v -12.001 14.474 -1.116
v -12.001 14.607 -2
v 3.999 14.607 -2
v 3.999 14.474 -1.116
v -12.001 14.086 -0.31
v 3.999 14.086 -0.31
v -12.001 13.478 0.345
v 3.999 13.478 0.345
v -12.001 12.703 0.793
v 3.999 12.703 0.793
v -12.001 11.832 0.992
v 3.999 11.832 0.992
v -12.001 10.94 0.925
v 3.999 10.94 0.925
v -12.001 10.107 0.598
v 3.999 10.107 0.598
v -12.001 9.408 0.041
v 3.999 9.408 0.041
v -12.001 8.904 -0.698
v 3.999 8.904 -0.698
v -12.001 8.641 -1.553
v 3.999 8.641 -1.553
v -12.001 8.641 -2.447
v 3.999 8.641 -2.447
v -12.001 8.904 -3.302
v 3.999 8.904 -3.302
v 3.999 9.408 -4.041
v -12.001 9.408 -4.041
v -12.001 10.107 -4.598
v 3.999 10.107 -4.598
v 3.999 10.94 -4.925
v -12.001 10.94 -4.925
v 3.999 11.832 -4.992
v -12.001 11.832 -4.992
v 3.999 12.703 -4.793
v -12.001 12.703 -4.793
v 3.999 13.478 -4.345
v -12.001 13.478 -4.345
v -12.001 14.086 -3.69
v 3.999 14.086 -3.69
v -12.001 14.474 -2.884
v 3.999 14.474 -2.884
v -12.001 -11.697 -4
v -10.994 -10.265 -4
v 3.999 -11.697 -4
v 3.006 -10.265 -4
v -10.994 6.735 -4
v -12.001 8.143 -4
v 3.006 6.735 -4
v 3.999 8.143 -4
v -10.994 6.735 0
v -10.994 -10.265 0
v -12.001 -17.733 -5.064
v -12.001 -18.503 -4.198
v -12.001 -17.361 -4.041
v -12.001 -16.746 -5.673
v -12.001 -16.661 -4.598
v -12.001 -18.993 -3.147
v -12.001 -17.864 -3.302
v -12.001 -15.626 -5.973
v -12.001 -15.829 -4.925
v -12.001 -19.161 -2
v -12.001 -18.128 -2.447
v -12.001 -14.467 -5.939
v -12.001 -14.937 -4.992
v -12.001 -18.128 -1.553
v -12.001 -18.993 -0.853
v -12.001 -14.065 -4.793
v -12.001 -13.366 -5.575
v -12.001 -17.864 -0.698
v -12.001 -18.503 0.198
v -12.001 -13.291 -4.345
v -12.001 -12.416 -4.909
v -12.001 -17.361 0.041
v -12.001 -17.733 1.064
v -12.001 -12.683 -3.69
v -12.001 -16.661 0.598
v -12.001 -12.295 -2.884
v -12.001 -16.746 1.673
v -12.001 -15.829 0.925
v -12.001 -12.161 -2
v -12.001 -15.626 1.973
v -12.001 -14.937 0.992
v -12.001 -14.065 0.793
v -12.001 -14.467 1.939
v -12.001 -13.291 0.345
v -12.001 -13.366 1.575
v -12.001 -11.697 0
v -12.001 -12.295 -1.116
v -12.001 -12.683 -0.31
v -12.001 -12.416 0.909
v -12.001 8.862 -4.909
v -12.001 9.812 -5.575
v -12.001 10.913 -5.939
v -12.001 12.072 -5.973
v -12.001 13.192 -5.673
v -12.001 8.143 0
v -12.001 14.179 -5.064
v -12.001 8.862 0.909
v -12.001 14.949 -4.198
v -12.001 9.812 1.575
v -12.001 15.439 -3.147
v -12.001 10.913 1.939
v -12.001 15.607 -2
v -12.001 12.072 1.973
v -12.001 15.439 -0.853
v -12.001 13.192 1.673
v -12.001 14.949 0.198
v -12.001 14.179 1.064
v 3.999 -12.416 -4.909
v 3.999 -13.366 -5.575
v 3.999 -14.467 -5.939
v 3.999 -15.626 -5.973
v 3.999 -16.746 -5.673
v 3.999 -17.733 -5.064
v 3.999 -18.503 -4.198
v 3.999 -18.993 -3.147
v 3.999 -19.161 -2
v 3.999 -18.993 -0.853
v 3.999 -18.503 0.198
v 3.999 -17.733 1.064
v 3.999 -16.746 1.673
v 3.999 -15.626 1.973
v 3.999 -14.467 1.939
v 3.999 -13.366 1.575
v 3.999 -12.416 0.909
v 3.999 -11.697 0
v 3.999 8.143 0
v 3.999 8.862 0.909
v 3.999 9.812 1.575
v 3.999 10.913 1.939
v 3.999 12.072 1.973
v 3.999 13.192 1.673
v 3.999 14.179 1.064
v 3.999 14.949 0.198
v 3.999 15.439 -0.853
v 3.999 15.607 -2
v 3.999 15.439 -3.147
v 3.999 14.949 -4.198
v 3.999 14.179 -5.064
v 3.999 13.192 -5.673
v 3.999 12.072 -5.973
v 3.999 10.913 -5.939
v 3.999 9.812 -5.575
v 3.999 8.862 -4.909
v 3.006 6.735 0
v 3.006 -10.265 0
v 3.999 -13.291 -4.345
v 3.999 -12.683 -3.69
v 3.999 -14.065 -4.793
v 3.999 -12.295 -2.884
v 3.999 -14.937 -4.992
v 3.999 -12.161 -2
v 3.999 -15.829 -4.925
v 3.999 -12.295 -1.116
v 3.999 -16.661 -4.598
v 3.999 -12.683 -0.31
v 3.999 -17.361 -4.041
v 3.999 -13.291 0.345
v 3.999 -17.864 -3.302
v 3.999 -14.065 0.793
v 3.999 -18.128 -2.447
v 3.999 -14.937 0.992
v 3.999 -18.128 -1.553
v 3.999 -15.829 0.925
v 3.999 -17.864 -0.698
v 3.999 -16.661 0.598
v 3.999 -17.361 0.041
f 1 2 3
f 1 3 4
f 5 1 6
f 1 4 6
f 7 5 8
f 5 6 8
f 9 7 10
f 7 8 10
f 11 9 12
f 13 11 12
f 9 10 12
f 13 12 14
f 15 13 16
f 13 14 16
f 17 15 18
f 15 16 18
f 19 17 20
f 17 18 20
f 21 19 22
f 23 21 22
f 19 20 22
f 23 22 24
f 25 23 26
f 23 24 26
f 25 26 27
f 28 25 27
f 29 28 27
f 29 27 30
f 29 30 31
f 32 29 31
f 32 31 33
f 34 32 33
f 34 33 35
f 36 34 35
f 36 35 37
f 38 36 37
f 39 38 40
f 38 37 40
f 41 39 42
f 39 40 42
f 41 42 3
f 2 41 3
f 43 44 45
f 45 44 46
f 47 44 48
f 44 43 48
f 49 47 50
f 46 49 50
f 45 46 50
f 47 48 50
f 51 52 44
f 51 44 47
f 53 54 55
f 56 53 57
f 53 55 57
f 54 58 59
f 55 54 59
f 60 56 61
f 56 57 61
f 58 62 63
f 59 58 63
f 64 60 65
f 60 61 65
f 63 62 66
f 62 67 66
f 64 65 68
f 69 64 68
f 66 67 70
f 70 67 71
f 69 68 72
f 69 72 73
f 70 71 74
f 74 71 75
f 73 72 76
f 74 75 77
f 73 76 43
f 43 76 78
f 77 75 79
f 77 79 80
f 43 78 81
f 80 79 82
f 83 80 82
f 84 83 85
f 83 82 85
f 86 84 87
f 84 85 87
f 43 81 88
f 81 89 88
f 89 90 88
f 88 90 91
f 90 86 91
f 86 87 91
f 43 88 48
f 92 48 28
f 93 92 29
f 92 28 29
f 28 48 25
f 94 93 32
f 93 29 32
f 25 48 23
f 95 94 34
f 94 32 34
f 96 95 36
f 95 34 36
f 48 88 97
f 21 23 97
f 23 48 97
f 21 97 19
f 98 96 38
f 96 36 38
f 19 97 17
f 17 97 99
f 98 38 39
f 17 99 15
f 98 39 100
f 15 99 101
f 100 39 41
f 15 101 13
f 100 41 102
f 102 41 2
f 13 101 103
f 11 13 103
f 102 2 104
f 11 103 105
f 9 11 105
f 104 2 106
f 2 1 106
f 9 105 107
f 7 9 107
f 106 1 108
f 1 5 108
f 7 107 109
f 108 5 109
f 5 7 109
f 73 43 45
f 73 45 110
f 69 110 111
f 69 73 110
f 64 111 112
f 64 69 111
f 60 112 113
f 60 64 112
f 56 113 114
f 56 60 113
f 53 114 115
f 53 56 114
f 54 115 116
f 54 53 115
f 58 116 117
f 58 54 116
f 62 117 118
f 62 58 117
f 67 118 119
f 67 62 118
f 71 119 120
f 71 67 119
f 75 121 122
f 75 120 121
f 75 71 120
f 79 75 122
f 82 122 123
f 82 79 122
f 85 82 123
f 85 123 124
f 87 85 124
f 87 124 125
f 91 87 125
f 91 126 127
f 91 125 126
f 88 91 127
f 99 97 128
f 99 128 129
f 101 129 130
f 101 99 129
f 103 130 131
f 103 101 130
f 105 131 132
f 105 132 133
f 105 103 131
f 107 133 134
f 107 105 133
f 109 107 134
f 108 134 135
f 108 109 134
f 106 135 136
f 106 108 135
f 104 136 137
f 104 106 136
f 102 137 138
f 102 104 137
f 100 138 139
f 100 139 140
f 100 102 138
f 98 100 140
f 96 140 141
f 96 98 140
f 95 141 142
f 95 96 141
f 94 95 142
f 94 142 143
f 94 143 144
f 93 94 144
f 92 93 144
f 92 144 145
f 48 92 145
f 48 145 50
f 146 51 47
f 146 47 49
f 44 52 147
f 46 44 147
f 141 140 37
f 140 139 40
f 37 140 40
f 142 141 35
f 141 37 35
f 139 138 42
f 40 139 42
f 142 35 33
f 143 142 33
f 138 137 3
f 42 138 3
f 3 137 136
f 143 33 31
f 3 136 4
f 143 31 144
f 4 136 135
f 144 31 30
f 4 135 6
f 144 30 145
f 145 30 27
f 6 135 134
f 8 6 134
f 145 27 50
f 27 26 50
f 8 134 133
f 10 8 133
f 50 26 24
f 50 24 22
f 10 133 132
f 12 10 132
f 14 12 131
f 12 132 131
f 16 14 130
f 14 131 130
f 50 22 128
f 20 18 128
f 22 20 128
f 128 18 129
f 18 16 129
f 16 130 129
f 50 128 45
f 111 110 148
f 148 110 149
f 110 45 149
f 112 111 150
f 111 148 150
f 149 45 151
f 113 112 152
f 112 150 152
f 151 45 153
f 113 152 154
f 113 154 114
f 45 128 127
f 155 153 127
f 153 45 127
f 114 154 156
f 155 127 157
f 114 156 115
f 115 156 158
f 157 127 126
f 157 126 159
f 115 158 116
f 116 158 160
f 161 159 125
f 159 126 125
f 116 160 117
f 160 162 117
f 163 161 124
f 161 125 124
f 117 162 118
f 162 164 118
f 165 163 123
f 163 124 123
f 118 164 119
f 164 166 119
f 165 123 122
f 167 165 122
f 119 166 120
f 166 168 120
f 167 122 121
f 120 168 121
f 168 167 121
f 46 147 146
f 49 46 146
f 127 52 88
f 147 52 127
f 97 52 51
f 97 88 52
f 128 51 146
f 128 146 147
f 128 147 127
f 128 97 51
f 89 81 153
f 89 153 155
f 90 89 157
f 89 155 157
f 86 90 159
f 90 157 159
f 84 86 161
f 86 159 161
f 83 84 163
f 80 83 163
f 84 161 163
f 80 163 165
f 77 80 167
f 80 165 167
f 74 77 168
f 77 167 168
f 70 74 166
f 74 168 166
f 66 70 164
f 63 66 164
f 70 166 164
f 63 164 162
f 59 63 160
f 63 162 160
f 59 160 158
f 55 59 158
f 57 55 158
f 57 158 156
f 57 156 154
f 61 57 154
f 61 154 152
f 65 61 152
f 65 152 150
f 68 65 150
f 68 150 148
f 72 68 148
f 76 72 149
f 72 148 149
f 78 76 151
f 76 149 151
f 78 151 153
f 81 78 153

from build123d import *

# Parameters (mm, degrees)
F0_W     = 16
F0_H     = 20
F0_W_2   = 14
F0_H_2   = 17
F1_DEPTH = 4
F2_R     = 4
F3_DEPTH = 16
F4_R     = 3
F5_DEPTH = 16


with BuildPart() as f1:
    # F0 (on Top) → F1 (new body)
    with BuildSketch(Plane.XY):
        with Locations((-4.000824, -1.813023)):
            Rectangle(F0_W, F0_H)
        with Locations((-3.993993, -1.764975)):
            Rectangle(F0_W_2, F0_H_2, mode=Mode.SUBTRACT)
    extrude(amount=-F1_DEPTH)

    # F2 (on face) → F3 (join)
    with BuildSketch(Plane(origin=(-12.000824, 0, 0), x_dir=(0, -1, 0), z_dir=(-1, 0, 0))):
        with Locations((-11.607357, -2)):
            Circle(F2_R)
        with Locations((15.161447, -2)):
            Circle(F2_R)
    extrude(amount=-F3_DEPTH)

    # F4 (on face) → F5 (cut)
    with BuildSketch(Plane.YZ.offset(3.999176)):
        with Locations((-15.161447, -2)):
            Circle(F4_R)
        with Locations((11.607357, -2)):
            Circle(F4_R)
    extrude(amount=-F5_DEPTH, mode=Mode.SUBTRACT)


solid = f1.part
